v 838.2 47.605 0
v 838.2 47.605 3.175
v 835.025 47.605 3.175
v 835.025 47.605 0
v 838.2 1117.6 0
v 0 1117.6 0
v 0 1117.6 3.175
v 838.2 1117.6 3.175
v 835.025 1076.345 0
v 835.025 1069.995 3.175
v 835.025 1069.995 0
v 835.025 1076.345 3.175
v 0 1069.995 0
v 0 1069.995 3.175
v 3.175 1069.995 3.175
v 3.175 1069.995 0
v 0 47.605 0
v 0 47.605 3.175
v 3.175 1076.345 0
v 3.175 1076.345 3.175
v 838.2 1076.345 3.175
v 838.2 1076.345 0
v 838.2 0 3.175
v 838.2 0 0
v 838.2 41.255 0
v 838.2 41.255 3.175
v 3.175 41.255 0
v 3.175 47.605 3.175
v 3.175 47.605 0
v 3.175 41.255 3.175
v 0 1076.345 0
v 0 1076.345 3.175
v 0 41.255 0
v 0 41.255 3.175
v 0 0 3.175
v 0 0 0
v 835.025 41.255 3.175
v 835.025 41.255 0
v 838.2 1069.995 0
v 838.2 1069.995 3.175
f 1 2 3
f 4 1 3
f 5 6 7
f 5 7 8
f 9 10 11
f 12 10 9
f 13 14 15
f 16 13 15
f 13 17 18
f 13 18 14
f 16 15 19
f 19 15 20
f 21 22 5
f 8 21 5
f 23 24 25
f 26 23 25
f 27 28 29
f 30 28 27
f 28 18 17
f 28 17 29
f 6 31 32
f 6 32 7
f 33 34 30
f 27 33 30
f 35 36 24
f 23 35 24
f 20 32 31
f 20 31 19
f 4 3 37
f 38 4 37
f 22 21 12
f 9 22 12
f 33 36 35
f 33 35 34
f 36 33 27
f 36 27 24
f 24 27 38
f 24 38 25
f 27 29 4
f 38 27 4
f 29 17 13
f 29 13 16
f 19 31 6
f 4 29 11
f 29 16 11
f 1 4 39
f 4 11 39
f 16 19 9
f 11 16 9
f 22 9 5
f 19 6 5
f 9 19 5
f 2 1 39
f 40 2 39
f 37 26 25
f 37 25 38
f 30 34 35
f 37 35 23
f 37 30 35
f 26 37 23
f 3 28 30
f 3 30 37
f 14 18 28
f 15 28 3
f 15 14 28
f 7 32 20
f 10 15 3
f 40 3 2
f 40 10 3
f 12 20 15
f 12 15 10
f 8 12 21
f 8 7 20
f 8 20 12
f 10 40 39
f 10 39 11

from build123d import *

# Parameters (mm, degrees)
SKETCH1_W               = 838.2
SKETCH1_H               = 1117.6
BOSS_EXTRUDE1_DEPTH     = 3.175
SKETCH3_W               = 3.175
SKETCH3_H               = 6.35
CUT_EXTRUDE2_DEPTH      = 25.4
MIRROR3_COPY_1_SKETCH_W = 3.175
MIRROR3_COPY_1_SKETCH_H = 6.35
MIRROR3_COPY_1_DEPTH    = 25.4


with BuildPart() as part:
    # Sketch1 → Boss-Extrude1 (new body)
    with BuildSketch(Plane.XY):
        with Locations((419.1, 558.8)):
            Rectangle(SKETCH1_W, SKETCH1_H)
    extrude(amount=BOSS_EXTRUDE1_DEPTH)

    # Sketch3 → Cut-Extrude2 (cut)
    with BuildSketch(Plane.XY.offset(3.175)):
        with Locations((1.5875, 1073.170453208)):
            Rectangle(SKETCH3_W, SKETCH3_H)
    cut_extrude2 = extrude(amount=-CUT_EXTRUDE2_DEPTH, mode=Mode.SUBTRACT)

    # Mirror1: Cut-Extrude2 across plane
    add(cut_extrude2.mirror(Plane.ZX.offset(558.8)), mode=Mode.SUBTRACT)

    # Mirror3: Cut-Extrude2 across plane
    add(cut_extrude2.mirror(Plane.ZY.offset(-419.1)), mode=Mode.SUBTRACT)

    # Mirror3 copy 1 sketch → Mirror3 copy 1 (cut)
    with BuildSketch(Plane(origin=(838.2, 1117.6, 3.175), x_dir=(-1, 0, 0), z_dir=(0, 0, 1))):
        with Locations((1.5875, 1073.170453208)):
            Rectangle(MIRROR3_COPY_1_SKETCH_W, MIRROR3_COPY_1_SKETCH_H)
    extrude(amount=-MIRROR3_COPY_1_DEPTH, mode=Mode.SUBTRACT)


solid = part.part
